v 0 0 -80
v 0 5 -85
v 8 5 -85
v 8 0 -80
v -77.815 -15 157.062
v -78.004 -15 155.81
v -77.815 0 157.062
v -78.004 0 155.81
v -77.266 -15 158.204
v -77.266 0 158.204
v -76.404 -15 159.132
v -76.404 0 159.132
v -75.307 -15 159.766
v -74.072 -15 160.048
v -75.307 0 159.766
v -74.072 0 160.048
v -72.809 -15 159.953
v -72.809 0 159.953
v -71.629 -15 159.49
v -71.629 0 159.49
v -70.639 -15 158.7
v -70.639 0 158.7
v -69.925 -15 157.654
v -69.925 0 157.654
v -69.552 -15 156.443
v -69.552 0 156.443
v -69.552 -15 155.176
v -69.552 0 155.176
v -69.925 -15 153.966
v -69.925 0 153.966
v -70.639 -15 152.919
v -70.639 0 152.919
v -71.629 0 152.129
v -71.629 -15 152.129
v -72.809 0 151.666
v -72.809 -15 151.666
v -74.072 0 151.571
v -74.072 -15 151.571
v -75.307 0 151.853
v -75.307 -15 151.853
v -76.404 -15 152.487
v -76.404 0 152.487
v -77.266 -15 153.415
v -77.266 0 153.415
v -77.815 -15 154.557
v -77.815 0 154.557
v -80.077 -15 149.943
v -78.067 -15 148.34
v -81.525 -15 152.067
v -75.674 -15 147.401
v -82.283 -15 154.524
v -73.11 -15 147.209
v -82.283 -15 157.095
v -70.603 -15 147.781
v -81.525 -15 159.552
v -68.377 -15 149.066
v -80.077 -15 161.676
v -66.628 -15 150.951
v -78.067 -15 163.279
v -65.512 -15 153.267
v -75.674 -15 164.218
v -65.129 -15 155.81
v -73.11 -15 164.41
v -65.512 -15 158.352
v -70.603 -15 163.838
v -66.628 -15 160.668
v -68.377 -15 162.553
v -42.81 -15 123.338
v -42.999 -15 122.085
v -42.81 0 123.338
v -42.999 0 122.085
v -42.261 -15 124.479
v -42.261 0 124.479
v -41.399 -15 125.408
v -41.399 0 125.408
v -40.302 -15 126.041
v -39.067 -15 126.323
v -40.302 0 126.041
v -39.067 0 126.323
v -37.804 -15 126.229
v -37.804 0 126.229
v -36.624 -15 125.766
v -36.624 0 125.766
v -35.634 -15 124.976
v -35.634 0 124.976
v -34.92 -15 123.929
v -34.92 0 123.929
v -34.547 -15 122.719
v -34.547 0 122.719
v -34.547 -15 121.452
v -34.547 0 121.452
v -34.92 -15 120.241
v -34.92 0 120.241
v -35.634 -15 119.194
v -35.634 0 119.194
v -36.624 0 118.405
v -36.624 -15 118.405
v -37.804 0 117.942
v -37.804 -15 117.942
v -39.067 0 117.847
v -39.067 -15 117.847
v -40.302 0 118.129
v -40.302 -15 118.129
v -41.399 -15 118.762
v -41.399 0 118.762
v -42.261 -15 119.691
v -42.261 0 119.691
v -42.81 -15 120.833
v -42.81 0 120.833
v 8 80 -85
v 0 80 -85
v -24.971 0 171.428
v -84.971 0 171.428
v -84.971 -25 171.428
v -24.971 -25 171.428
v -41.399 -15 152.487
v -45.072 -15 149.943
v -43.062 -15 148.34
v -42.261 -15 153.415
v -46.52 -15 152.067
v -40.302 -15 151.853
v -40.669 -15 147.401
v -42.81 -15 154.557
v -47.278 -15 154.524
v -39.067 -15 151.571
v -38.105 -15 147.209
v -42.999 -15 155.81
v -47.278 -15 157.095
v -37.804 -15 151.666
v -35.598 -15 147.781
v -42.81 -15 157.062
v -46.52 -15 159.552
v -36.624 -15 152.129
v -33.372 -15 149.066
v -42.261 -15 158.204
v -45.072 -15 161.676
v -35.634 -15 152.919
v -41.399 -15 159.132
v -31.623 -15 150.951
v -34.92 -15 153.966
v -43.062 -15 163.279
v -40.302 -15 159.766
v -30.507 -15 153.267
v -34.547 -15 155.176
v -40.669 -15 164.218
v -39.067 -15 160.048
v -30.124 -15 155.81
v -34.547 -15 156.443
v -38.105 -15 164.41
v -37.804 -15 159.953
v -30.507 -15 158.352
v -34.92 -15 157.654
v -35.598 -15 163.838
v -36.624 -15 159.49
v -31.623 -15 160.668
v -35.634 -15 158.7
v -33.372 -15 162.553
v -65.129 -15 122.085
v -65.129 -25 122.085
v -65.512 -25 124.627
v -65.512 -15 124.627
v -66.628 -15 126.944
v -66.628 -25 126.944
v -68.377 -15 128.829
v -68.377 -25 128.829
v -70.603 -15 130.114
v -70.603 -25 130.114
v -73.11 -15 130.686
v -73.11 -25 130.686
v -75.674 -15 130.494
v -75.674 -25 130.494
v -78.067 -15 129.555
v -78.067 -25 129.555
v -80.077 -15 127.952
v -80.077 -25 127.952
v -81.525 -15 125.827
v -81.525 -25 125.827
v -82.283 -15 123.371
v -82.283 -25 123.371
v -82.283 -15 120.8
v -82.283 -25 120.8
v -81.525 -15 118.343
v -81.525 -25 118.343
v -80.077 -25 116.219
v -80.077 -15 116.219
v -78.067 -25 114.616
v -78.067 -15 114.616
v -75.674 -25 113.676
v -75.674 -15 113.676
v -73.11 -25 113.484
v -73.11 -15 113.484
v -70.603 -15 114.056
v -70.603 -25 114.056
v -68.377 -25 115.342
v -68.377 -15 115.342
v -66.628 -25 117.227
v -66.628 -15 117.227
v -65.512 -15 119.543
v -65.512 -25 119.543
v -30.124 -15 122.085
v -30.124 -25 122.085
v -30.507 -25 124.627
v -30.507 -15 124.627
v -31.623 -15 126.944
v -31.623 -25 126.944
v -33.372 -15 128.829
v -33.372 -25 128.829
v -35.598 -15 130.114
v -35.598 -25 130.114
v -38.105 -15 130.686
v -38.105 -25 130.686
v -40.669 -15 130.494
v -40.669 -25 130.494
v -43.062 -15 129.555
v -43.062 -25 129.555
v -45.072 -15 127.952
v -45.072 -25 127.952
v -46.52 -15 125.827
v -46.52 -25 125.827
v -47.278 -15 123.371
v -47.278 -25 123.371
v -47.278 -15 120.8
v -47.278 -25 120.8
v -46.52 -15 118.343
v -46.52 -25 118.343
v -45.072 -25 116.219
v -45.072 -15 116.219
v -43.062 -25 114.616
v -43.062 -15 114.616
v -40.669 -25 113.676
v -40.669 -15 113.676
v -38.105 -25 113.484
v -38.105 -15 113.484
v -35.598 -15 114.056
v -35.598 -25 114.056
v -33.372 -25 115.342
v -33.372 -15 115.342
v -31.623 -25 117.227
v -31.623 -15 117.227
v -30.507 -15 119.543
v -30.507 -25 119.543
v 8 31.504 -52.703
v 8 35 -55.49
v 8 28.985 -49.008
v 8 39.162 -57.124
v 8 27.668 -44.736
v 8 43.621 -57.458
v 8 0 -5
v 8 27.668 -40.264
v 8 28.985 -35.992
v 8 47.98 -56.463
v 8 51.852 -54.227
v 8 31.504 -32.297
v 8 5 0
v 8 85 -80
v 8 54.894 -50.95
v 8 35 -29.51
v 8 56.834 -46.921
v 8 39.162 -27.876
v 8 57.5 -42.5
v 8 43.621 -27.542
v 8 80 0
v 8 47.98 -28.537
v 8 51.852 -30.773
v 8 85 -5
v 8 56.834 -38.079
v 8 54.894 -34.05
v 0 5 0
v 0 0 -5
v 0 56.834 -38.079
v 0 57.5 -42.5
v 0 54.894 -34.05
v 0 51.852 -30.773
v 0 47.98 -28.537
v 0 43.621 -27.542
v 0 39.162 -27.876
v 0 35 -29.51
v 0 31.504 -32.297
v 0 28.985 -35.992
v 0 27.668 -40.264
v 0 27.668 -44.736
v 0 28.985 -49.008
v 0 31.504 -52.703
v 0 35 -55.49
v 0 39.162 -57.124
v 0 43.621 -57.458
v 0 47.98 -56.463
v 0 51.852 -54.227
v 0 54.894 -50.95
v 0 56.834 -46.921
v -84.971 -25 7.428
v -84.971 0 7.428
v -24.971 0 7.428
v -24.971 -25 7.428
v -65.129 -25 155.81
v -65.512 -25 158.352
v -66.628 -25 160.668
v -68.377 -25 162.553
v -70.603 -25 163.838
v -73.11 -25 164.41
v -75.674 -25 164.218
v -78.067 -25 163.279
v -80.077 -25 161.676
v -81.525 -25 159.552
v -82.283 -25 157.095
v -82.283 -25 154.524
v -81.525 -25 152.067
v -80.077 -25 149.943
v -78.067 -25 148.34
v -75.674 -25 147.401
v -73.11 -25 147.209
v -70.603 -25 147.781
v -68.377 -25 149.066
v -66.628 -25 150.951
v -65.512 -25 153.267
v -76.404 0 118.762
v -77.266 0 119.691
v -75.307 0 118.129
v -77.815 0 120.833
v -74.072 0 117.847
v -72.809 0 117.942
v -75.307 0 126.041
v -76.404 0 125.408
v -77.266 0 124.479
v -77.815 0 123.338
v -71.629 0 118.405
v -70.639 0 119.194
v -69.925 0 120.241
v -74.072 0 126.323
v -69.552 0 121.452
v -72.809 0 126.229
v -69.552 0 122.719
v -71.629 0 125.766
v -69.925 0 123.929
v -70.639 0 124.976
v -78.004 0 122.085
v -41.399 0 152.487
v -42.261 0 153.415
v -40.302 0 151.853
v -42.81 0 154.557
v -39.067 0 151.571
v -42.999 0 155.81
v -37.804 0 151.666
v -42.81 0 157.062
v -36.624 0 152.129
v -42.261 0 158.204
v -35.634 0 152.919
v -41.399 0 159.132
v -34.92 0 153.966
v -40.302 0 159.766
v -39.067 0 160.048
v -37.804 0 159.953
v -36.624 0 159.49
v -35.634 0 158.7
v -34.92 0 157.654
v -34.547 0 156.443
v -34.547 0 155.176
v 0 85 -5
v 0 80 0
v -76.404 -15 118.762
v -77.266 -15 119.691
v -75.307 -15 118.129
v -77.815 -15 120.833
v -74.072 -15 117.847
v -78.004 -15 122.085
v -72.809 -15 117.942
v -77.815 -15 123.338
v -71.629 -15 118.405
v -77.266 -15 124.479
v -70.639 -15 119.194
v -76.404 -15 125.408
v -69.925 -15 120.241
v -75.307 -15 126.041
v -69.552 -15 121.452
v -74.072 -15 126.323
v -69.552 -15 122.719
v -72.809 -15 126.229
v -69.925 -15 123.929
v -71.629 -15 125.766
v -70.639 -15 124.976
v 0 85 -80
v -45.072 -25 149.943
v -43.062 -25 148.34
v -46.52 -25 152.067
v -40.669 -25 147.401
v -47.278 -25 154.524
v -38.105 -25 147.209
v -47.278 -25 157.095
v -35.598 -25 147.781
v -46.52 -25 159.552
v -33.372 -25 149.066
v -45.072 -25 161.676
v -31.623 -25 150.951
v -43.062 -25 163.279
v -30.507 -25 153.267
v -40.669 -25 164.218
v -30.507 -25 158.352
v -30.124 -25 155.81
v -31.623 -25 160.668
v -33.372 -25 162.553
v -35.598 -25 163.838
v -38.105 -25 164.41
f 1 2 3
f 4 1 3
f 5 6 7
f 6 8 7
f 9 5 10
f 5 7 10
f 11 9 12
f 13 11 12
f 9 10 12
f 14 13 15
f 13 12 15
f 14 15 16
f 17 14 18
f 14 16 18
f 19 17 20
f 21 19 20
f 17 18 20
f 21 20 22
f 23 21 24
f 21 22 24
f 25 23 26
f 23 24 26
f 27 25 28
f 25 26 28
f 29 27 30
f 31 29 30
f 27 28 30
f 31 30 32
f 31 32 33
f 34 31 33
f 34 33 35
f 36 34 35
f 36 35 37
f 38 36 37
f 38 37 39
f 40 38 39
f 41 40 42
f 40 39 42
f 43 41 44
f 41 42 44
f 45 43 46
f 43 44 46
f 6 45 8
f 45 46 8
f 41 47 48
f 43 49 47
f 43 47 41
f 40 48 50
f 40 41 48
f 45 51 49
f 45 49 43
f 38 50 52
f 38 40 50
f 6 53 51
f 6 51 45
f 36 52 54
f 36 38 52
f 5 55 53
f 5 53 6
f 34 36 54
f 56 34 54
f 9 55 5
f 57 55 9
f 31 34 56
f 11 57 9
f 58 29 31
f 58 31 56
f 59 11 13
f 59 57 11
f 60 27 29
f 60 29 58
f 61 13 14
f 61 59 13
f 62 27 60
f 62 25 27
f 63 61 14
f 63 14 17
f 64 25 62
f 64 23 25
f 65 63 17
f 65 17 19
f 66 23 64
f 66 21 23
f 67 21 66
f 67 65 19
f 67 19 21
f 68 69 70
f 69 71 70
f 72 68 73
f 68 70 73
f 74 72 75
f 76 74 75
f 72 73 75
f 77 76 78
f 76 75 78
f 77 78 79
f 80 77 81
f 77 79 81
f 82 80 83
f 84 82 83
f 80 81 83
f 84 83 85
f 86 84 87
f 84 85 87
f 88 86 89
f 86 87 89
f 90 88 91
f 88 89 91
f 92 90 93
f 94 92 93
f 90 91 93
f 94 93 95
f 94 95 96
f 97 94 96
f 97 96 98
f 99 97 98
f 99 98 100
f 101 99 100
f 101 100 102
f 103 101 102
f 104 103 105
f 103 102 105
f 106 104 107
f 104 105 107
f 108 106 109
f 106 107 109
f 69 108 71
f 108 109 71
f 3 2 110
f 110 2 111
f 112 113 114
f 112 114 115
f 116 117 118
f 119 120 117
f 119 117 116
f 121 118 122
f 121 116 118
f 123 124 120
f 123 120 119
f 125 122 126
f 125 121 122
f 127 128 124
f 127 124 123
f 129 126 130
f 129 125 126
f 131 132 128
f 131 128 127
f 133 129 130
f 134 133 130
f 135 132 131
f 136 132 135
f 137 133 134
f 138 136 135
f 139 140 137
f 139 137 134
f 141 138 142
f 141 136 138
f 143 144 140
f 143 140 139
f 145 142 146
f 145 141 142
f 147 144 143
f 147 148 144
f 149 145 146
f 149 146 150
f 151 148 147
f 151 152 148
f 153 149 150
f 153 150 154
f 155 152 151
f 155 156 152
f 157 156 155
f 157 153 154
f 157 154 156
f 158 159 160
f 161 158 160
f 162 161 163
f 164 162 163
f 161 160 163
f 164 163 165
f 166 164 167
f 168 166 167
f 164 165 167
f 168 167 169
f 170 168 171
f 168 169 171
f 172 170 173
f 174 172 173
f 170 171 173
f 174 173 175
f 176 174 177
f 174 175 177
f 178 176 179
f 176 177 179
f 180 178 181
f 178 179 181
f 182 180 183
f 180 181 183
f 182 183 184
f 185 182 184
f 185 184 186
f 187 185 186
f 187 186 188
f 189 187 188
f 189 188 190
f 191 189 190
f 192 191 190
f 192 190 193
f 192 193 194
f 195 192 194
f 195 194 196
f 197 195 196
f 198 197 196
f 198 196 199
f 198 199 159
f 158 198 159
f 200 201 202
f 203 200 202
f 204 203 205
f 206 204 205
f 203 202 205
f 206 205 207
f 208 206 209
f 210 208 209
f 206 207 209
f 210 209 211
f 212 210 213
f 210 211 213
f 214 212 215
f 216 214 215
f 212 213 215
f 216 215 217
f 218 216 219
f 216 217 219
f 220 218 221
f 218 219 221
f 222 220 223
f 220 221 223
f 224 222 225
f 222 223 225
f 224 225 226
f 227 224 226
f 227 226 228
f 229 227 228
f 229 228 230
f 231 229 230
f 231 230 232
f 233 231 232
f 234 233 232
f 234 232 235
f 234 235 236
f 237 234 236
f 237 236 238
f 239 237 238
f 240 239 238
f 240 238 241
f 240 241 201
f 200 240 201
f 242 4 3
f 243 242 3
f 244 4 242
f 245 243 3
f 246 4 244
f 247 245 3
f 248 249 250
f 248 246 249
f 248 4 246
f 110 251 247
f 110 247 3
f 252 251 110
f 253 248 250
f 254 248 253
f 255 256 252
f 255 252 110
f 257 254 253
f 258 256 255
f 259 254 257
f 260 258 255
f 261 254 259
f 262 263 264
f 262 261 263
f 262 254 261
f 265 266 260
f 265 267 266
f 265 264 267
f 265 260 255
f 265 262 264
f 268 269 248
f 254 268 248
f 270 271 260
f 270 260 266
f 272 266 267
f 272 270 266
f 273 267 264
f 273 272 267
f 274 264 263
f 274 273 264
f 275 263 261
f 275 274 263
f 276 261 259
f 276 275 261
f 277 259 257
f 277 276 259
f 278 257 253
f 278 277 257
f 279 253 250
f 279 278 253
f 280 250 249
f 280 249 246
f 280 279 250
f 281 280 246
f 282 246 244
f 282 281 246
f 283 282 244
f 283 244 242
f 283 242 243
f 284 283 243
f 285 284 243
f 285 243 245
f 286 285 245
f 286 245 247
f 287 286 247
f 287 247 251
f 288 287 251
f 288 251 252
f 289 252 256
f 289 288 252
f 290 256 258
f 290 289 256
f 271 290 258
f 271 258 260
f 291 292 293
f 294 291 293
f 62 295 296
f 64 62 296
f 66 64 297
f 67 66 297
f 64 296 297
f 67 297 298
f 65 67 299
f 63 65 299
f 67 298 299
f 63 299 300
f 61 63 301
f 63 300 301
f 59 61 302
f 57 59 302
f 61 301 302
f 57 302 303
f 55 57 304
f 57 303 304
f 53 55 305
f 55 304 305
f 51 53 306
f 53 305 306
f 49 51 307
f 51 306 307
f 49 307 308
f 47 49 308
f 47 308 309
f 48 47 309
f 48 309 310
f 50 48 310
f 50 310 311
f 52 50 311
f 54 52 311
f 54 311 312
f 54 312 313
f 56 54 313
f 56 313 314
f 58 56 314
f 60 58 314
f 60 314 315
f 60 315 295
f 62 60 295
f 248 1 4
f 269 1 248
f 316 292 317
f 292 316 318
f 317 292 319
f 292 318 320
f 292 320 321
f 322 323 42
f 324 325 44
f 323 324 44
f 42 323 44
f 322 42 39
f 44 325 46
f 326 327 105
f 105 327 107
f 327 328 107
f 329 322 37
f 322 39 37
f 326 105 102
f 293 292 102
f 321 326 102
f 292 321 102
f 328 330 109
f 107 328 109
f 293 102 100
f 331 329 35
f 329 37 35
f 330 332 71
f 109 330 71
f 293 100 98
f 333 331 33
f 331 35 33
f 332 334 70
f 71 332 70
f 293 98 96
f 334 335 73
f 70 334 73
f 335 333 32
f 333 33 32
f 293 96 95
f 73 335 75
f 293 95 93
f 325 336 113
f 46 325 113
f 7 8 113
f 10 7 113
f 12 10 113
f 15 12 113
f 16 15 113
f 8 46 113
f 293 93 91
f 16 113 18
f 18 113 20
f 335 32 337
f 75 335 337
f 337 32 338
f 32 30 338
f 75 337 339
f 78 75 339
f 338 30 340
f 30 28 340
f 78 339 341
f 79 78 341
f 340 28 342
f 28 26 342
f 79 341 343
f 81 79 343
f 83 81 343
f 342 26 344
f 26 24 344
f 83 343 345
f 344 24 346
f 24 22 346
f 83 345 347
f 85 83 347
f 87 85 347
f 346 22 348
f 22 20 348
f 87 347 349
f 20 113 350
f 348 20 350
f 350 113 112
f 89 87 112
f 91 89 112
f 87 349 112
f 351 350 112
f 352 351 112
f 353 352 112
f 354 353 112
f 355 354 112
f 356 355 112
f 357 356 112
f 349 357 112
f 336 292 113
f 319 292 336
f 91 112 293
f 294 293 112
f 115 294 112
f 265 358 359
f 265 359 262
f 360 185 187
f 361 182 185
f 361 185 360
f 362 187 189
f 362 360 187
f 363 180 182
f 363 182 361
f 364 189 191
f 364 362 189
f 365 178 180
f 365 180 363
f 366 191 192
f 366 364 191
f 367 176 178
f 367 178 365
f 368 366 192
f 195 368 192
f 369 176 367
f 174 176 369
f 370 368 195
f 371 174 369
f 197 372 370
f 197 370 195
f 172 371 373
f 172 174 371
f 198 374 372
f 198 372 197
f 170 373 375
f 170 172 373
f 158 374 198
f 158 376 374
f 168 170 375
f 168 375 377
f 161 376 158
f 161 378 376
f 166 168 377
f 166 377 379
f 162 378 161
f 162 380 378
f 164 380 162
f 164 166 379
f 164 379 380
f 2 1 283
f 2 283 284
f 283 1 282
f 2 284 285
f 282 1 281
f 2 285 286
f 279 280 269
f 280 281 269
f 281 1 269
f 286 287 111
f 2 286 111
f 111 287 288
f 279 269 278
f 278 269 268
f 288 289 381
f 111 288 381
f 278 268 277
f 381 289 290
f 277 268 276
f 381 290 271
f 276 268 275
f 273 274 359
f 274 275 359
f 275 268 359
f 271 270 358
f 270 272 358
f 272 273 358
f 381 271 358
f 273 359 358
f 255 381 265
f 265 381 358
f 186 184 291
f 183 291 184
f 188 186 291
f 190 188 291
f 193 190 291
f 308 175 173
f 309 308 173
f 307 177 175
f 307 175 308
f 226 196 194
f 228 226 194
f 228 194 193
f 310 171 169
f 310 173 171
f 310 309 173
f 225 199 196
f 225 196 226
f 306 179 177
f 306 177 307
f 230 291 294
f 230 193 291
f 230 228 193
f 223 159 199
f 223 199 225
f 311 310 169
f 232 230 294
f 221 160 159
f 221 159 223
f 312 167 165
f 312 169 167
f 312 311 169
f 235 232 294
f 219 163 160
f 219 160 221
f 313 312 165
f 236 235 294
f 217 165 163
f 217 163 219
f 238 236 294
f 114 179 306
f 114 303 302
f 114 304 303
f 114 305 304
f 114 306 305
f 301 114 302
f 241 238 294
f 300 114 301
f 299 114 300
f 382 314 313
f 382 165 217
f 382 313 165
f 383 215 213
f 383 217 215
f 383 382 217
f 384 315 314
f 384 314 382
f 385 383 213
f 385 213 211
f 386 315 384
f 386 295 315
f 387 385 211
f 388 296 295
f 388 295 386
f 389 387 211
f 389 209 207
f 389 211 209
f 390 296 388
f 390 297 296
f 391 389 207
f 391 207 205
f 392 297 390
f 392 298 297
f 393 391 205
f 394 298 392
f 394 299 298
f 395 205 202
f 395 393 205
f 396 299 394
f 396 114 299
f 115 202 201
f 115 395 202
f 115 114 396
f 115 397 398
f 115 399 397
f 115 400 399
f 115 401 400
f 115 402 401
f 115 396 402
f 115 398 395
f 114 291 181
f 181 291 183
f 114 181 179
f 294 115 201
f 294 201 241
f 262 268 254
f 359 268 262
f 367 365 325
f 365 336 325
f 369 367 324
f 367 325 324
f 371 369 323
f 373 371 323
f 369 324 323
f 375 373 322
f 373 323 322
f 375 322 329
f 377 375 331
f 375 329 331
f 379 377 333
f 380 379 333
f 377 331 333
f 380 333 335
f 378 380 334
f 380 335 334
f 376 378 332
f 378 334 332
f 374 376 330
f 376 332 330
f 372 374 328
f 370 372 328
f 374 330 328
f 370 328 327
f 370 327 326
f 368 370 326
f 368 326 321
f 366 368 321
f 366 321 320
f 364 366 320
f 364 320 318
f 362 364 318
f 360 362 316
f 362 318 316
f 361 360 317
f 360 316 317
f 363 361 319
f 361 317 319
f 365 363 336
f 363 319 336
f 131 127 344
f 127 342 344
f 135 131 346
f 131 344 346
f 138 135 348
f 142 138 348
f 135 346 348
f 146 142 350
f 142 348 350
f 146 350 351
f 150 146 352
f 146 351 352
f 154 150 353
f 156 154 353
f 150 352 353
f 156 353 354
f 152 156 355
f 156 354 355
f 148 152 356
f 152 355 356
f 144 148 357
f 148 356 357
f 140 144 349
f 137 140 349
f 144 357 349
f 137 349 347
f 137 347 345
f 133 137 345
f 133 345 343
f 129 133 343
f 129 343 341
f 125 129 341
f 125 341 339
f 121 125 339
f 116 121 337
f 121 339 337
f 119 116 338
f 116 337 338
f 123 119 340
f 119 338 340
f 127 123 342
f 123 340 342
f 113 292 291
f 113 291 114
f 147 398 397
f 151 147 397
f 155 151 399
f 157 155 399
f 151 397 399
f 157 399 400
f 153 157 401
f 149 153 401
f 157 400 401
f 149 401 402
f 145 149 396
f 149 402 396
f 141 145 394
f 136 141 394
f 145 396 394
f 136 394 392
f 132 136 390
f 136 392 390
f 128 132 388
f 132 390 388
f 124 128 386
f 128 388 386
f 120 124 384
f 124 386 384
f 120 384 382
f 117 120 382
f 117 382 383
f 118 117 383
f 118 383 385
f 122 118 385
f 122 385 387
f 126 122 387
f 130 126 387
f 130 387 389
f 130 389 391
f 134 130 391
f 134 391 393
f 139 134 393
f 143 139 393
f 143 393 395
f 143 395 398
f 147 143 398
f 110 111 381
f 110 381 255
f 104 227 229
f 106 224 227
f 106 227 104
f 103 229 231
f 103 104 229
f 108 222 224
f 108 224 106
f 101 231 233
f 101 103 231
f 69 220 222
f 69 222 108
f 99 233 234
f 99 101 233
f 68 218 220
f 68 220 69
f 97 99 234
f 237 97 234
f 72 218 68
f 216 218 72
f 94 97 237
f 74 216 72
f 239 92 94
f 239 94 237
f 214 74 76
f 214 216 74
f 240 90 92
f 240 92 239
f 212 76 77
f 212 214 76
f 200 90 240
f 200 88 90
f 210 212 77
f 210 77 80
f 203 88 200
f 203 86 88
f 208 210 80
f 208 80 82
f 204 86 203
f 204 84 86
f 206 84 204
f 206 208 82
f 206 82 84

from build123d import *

# Parameters (mm, degrees)
F0_W           = 85
F0_H           = 85
F0_R           = 15
F1_DEPTH       = 8
F2_SIZE        = 5
F3_SIZE        = 5
F4_W           = 60
F4_H           = 164
F5_DEPTH       = 25
F7_D           = 8.5
F7_CBORE_D     = 17.25
F7_CBORE_DEPTH = 10


with BuildPart() as f1:
    # F0 (on Right) → F1 (new body)
    with BuildSketch(Plane.YZ):
        with Locations((42.5, -42.5)):
            Rectangle(F0_W, F0_H)
        with Locations((42.5, -42.5)):
            Circle(F0_R, mode=Mode.SUBTRACT)
    extrude(amount=F1_DEPTH)

    # F2
    f2_edges = [f1.edges().sort_by_distance(p)[0] for p in [
        (4, 85, 0),
    ]]
    chamfer(f2_edges, length=F2_SIZE)

    # F3
    f3_edges = [f1.edges().sort_by_distance(p)[0] for p in [
        (4, 0, 0),
        (4, 0, -85),
        (4, 85, -85),
    ]]
    chamfer(f3_edges, length=F3_SIZE)


with BuildPart() as f5:
    # F4 (on Front) → F5 (new body)
    with BuildSketch(Plane.XZ):
        with Locations((-54.9711163342, 89.4281147681)):
            Rectangle(F4_W, F4_H)
    extrude(amount=F5_DEPTH)

    # F7 (through all)
    with Locations(Plane.XZ.offset(25)):
        with Locations((-73.7542882562, 155.8095365763), (-38.7492962182, 155.8095365763), (-38.7492962182, 122.0852136612), (-73.7542882562, 122.0852136612)):
            CounterBoreHole(F7_D / 2, F7_CBORE_D / 2, F7_CBORE_DEPTH)


solid = Compound([f1.part, f5.part])
